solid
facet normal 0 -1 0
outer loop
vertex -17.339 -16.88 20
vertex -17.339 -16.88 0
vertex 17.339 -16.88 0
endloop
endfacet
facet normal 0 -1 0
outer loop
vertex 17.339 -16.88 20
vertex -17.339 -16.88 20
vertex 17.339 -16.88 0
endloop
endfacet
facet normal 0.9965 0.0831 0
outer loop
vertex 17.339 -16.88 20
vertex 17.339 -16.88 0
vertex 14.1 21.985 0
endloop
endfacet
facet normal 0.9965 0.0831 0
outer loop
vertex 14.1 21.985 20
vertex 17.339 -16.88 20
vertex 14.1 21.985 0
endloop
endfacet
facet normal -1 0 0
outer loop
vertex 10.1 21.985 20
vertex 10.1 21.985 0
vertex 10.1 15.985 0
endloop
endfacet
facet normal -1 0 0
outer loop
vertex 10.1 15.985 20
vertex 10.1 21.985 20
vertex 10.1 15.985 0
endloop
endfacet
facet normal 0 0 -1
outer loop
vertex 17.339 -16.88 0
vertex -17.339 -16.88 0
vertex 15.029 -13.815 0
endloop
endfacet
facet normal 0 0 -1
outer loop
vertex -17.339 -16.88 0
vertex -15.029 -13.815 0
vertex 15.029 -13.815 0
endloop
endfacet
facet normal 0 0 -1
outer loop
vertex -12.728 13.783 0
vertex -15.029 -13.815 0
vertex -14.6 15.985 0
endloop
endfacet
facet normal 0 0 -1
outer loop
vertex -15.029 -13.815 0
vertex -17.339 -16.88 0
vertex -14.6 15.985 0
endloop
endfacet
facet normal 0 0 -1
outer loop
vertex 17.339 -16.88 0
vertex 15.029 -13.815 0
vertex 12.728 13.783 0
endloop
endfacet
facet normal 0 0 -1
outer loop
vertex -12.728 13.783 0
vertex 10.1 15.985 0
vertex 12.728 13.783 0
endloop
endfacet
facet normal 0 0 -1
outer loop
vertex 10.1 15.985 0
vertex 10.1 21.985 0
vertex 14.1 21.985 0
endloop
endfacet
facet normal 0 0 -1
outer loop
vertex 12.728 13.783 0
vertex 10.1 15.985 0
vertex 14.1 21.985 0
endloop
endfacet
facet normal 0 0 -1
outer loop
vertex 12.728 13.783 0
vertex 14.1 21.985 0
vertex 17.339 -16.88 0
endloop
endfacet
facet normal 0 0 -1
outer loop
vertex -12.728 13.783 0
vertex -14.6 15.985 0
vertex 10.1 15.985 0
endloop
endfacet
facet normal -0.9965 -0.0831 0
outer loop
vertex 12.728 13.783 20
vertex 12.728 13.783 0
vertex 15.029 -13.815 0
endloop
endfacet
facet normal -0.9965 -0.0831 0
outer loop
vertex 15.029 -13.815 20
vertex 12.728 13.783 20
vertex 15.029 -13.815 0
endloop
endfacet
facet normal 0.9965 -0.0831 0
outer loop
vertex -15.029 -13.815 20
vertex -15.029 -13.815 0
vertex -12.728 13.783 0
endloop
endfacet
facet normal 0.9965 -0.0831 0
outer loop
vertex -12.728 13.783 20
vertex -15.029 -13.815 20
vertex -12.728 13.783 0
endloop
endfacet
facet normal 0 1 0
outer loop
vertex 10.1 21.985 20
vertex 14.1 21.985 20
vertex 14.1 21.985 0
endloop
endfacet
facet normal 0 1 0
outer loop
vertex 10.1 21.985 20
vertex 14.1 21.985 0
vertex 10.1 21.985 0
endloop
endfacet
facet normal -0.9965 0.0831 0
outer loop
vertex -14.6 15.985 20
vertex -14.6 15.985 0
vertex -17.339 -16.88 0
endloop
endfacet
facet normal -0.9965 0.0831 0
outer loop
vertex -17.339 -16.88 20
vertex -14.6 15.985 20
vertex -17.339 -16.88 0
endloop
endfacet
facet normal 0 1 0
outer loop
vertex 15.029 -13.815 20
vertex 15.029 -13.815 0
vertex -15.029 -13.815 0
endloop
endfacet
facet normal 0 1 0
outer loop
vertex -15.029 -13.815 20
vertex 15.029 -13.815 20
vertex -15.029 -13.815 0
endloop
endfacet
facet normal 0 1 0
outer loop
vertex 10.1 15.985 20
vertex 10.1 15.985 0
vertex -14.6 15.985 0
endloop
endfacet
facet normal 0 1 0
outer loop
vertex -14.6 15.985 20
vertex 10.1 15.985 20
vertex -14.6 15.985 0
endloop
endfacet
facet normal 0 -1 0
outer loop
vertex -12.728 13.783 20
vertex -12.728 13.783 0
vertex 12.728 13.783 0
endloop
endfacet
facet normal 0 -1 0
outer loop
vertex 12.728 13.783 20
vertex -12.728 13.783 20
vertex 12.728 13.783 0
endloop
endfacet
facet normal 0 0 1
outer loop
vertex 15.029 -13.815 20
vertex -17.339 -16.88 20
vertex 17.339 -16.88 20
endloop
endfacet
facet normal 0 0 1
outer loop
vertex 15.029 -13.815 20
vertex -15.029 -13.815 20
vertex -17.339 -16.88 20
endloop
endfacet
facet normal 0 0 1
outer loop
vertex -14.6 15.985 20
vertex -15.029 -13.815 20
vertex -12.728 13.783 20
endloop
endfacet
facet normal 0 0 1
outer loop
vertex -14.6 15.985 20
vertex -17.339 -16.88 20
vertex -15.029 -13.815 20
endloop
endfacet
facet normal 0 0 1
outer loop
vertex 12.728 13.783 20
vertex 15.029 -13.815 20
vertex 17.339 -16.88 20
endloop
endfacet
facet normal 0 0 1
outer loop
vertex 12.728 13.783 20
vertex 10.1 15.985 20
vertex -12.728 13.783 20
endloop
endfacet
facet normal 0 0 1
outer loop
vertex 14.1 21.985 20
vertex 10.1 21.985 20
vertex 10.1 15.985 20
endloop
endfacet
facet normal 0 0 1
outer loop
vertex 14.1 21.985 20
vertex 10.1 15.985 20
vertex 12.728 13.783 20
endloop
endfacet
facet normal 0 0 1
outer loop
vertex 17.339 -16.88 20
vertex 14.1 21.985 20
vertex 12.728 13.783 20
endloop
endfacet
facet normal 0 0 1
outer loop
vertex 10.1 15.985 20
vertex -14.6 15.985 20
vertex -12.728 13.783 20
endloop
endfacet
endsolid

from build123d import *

# Parameters (mm, degrees)
F1_DEPTH = 20


# Not quite as in the source:
# - a feature names something its author has since deleted; it is built from what else it names


with BuildPart() as f1:
    # F0 (on Top) → F1 (new body)
    with BuildSketch(Plane.XY):
        Polygon((0, 15.9851339135), (-10.1, 15.9851339135), (-14.6001070377, 15.9851339135), (-17.3394622729, -16.880093272), (0, -16.880093272), (17.3394622729, -16.880093272), (14.1, 21.9851339135), (10.1, 21.9851339135), (10.1, 15.9851339135), align=None)
        Polygon((11.9072113089, -13.8146081649), (-11.9072113089, -13.8146081649), (-15.0287533179, -13.8146081649), (-12.7284283152, 13.7833838166), (-9.6068863062, 13.7833838166), (0, 13.7833838166), (9.6068863062, 13.7833838166), (12.7284283152, 13.7833838166), (15.0287533179, -13.8146081649), align=None, mode=Mode.SUBTRACT)
    extrude(amount=F1_DEPTH)


solid = f1.part
